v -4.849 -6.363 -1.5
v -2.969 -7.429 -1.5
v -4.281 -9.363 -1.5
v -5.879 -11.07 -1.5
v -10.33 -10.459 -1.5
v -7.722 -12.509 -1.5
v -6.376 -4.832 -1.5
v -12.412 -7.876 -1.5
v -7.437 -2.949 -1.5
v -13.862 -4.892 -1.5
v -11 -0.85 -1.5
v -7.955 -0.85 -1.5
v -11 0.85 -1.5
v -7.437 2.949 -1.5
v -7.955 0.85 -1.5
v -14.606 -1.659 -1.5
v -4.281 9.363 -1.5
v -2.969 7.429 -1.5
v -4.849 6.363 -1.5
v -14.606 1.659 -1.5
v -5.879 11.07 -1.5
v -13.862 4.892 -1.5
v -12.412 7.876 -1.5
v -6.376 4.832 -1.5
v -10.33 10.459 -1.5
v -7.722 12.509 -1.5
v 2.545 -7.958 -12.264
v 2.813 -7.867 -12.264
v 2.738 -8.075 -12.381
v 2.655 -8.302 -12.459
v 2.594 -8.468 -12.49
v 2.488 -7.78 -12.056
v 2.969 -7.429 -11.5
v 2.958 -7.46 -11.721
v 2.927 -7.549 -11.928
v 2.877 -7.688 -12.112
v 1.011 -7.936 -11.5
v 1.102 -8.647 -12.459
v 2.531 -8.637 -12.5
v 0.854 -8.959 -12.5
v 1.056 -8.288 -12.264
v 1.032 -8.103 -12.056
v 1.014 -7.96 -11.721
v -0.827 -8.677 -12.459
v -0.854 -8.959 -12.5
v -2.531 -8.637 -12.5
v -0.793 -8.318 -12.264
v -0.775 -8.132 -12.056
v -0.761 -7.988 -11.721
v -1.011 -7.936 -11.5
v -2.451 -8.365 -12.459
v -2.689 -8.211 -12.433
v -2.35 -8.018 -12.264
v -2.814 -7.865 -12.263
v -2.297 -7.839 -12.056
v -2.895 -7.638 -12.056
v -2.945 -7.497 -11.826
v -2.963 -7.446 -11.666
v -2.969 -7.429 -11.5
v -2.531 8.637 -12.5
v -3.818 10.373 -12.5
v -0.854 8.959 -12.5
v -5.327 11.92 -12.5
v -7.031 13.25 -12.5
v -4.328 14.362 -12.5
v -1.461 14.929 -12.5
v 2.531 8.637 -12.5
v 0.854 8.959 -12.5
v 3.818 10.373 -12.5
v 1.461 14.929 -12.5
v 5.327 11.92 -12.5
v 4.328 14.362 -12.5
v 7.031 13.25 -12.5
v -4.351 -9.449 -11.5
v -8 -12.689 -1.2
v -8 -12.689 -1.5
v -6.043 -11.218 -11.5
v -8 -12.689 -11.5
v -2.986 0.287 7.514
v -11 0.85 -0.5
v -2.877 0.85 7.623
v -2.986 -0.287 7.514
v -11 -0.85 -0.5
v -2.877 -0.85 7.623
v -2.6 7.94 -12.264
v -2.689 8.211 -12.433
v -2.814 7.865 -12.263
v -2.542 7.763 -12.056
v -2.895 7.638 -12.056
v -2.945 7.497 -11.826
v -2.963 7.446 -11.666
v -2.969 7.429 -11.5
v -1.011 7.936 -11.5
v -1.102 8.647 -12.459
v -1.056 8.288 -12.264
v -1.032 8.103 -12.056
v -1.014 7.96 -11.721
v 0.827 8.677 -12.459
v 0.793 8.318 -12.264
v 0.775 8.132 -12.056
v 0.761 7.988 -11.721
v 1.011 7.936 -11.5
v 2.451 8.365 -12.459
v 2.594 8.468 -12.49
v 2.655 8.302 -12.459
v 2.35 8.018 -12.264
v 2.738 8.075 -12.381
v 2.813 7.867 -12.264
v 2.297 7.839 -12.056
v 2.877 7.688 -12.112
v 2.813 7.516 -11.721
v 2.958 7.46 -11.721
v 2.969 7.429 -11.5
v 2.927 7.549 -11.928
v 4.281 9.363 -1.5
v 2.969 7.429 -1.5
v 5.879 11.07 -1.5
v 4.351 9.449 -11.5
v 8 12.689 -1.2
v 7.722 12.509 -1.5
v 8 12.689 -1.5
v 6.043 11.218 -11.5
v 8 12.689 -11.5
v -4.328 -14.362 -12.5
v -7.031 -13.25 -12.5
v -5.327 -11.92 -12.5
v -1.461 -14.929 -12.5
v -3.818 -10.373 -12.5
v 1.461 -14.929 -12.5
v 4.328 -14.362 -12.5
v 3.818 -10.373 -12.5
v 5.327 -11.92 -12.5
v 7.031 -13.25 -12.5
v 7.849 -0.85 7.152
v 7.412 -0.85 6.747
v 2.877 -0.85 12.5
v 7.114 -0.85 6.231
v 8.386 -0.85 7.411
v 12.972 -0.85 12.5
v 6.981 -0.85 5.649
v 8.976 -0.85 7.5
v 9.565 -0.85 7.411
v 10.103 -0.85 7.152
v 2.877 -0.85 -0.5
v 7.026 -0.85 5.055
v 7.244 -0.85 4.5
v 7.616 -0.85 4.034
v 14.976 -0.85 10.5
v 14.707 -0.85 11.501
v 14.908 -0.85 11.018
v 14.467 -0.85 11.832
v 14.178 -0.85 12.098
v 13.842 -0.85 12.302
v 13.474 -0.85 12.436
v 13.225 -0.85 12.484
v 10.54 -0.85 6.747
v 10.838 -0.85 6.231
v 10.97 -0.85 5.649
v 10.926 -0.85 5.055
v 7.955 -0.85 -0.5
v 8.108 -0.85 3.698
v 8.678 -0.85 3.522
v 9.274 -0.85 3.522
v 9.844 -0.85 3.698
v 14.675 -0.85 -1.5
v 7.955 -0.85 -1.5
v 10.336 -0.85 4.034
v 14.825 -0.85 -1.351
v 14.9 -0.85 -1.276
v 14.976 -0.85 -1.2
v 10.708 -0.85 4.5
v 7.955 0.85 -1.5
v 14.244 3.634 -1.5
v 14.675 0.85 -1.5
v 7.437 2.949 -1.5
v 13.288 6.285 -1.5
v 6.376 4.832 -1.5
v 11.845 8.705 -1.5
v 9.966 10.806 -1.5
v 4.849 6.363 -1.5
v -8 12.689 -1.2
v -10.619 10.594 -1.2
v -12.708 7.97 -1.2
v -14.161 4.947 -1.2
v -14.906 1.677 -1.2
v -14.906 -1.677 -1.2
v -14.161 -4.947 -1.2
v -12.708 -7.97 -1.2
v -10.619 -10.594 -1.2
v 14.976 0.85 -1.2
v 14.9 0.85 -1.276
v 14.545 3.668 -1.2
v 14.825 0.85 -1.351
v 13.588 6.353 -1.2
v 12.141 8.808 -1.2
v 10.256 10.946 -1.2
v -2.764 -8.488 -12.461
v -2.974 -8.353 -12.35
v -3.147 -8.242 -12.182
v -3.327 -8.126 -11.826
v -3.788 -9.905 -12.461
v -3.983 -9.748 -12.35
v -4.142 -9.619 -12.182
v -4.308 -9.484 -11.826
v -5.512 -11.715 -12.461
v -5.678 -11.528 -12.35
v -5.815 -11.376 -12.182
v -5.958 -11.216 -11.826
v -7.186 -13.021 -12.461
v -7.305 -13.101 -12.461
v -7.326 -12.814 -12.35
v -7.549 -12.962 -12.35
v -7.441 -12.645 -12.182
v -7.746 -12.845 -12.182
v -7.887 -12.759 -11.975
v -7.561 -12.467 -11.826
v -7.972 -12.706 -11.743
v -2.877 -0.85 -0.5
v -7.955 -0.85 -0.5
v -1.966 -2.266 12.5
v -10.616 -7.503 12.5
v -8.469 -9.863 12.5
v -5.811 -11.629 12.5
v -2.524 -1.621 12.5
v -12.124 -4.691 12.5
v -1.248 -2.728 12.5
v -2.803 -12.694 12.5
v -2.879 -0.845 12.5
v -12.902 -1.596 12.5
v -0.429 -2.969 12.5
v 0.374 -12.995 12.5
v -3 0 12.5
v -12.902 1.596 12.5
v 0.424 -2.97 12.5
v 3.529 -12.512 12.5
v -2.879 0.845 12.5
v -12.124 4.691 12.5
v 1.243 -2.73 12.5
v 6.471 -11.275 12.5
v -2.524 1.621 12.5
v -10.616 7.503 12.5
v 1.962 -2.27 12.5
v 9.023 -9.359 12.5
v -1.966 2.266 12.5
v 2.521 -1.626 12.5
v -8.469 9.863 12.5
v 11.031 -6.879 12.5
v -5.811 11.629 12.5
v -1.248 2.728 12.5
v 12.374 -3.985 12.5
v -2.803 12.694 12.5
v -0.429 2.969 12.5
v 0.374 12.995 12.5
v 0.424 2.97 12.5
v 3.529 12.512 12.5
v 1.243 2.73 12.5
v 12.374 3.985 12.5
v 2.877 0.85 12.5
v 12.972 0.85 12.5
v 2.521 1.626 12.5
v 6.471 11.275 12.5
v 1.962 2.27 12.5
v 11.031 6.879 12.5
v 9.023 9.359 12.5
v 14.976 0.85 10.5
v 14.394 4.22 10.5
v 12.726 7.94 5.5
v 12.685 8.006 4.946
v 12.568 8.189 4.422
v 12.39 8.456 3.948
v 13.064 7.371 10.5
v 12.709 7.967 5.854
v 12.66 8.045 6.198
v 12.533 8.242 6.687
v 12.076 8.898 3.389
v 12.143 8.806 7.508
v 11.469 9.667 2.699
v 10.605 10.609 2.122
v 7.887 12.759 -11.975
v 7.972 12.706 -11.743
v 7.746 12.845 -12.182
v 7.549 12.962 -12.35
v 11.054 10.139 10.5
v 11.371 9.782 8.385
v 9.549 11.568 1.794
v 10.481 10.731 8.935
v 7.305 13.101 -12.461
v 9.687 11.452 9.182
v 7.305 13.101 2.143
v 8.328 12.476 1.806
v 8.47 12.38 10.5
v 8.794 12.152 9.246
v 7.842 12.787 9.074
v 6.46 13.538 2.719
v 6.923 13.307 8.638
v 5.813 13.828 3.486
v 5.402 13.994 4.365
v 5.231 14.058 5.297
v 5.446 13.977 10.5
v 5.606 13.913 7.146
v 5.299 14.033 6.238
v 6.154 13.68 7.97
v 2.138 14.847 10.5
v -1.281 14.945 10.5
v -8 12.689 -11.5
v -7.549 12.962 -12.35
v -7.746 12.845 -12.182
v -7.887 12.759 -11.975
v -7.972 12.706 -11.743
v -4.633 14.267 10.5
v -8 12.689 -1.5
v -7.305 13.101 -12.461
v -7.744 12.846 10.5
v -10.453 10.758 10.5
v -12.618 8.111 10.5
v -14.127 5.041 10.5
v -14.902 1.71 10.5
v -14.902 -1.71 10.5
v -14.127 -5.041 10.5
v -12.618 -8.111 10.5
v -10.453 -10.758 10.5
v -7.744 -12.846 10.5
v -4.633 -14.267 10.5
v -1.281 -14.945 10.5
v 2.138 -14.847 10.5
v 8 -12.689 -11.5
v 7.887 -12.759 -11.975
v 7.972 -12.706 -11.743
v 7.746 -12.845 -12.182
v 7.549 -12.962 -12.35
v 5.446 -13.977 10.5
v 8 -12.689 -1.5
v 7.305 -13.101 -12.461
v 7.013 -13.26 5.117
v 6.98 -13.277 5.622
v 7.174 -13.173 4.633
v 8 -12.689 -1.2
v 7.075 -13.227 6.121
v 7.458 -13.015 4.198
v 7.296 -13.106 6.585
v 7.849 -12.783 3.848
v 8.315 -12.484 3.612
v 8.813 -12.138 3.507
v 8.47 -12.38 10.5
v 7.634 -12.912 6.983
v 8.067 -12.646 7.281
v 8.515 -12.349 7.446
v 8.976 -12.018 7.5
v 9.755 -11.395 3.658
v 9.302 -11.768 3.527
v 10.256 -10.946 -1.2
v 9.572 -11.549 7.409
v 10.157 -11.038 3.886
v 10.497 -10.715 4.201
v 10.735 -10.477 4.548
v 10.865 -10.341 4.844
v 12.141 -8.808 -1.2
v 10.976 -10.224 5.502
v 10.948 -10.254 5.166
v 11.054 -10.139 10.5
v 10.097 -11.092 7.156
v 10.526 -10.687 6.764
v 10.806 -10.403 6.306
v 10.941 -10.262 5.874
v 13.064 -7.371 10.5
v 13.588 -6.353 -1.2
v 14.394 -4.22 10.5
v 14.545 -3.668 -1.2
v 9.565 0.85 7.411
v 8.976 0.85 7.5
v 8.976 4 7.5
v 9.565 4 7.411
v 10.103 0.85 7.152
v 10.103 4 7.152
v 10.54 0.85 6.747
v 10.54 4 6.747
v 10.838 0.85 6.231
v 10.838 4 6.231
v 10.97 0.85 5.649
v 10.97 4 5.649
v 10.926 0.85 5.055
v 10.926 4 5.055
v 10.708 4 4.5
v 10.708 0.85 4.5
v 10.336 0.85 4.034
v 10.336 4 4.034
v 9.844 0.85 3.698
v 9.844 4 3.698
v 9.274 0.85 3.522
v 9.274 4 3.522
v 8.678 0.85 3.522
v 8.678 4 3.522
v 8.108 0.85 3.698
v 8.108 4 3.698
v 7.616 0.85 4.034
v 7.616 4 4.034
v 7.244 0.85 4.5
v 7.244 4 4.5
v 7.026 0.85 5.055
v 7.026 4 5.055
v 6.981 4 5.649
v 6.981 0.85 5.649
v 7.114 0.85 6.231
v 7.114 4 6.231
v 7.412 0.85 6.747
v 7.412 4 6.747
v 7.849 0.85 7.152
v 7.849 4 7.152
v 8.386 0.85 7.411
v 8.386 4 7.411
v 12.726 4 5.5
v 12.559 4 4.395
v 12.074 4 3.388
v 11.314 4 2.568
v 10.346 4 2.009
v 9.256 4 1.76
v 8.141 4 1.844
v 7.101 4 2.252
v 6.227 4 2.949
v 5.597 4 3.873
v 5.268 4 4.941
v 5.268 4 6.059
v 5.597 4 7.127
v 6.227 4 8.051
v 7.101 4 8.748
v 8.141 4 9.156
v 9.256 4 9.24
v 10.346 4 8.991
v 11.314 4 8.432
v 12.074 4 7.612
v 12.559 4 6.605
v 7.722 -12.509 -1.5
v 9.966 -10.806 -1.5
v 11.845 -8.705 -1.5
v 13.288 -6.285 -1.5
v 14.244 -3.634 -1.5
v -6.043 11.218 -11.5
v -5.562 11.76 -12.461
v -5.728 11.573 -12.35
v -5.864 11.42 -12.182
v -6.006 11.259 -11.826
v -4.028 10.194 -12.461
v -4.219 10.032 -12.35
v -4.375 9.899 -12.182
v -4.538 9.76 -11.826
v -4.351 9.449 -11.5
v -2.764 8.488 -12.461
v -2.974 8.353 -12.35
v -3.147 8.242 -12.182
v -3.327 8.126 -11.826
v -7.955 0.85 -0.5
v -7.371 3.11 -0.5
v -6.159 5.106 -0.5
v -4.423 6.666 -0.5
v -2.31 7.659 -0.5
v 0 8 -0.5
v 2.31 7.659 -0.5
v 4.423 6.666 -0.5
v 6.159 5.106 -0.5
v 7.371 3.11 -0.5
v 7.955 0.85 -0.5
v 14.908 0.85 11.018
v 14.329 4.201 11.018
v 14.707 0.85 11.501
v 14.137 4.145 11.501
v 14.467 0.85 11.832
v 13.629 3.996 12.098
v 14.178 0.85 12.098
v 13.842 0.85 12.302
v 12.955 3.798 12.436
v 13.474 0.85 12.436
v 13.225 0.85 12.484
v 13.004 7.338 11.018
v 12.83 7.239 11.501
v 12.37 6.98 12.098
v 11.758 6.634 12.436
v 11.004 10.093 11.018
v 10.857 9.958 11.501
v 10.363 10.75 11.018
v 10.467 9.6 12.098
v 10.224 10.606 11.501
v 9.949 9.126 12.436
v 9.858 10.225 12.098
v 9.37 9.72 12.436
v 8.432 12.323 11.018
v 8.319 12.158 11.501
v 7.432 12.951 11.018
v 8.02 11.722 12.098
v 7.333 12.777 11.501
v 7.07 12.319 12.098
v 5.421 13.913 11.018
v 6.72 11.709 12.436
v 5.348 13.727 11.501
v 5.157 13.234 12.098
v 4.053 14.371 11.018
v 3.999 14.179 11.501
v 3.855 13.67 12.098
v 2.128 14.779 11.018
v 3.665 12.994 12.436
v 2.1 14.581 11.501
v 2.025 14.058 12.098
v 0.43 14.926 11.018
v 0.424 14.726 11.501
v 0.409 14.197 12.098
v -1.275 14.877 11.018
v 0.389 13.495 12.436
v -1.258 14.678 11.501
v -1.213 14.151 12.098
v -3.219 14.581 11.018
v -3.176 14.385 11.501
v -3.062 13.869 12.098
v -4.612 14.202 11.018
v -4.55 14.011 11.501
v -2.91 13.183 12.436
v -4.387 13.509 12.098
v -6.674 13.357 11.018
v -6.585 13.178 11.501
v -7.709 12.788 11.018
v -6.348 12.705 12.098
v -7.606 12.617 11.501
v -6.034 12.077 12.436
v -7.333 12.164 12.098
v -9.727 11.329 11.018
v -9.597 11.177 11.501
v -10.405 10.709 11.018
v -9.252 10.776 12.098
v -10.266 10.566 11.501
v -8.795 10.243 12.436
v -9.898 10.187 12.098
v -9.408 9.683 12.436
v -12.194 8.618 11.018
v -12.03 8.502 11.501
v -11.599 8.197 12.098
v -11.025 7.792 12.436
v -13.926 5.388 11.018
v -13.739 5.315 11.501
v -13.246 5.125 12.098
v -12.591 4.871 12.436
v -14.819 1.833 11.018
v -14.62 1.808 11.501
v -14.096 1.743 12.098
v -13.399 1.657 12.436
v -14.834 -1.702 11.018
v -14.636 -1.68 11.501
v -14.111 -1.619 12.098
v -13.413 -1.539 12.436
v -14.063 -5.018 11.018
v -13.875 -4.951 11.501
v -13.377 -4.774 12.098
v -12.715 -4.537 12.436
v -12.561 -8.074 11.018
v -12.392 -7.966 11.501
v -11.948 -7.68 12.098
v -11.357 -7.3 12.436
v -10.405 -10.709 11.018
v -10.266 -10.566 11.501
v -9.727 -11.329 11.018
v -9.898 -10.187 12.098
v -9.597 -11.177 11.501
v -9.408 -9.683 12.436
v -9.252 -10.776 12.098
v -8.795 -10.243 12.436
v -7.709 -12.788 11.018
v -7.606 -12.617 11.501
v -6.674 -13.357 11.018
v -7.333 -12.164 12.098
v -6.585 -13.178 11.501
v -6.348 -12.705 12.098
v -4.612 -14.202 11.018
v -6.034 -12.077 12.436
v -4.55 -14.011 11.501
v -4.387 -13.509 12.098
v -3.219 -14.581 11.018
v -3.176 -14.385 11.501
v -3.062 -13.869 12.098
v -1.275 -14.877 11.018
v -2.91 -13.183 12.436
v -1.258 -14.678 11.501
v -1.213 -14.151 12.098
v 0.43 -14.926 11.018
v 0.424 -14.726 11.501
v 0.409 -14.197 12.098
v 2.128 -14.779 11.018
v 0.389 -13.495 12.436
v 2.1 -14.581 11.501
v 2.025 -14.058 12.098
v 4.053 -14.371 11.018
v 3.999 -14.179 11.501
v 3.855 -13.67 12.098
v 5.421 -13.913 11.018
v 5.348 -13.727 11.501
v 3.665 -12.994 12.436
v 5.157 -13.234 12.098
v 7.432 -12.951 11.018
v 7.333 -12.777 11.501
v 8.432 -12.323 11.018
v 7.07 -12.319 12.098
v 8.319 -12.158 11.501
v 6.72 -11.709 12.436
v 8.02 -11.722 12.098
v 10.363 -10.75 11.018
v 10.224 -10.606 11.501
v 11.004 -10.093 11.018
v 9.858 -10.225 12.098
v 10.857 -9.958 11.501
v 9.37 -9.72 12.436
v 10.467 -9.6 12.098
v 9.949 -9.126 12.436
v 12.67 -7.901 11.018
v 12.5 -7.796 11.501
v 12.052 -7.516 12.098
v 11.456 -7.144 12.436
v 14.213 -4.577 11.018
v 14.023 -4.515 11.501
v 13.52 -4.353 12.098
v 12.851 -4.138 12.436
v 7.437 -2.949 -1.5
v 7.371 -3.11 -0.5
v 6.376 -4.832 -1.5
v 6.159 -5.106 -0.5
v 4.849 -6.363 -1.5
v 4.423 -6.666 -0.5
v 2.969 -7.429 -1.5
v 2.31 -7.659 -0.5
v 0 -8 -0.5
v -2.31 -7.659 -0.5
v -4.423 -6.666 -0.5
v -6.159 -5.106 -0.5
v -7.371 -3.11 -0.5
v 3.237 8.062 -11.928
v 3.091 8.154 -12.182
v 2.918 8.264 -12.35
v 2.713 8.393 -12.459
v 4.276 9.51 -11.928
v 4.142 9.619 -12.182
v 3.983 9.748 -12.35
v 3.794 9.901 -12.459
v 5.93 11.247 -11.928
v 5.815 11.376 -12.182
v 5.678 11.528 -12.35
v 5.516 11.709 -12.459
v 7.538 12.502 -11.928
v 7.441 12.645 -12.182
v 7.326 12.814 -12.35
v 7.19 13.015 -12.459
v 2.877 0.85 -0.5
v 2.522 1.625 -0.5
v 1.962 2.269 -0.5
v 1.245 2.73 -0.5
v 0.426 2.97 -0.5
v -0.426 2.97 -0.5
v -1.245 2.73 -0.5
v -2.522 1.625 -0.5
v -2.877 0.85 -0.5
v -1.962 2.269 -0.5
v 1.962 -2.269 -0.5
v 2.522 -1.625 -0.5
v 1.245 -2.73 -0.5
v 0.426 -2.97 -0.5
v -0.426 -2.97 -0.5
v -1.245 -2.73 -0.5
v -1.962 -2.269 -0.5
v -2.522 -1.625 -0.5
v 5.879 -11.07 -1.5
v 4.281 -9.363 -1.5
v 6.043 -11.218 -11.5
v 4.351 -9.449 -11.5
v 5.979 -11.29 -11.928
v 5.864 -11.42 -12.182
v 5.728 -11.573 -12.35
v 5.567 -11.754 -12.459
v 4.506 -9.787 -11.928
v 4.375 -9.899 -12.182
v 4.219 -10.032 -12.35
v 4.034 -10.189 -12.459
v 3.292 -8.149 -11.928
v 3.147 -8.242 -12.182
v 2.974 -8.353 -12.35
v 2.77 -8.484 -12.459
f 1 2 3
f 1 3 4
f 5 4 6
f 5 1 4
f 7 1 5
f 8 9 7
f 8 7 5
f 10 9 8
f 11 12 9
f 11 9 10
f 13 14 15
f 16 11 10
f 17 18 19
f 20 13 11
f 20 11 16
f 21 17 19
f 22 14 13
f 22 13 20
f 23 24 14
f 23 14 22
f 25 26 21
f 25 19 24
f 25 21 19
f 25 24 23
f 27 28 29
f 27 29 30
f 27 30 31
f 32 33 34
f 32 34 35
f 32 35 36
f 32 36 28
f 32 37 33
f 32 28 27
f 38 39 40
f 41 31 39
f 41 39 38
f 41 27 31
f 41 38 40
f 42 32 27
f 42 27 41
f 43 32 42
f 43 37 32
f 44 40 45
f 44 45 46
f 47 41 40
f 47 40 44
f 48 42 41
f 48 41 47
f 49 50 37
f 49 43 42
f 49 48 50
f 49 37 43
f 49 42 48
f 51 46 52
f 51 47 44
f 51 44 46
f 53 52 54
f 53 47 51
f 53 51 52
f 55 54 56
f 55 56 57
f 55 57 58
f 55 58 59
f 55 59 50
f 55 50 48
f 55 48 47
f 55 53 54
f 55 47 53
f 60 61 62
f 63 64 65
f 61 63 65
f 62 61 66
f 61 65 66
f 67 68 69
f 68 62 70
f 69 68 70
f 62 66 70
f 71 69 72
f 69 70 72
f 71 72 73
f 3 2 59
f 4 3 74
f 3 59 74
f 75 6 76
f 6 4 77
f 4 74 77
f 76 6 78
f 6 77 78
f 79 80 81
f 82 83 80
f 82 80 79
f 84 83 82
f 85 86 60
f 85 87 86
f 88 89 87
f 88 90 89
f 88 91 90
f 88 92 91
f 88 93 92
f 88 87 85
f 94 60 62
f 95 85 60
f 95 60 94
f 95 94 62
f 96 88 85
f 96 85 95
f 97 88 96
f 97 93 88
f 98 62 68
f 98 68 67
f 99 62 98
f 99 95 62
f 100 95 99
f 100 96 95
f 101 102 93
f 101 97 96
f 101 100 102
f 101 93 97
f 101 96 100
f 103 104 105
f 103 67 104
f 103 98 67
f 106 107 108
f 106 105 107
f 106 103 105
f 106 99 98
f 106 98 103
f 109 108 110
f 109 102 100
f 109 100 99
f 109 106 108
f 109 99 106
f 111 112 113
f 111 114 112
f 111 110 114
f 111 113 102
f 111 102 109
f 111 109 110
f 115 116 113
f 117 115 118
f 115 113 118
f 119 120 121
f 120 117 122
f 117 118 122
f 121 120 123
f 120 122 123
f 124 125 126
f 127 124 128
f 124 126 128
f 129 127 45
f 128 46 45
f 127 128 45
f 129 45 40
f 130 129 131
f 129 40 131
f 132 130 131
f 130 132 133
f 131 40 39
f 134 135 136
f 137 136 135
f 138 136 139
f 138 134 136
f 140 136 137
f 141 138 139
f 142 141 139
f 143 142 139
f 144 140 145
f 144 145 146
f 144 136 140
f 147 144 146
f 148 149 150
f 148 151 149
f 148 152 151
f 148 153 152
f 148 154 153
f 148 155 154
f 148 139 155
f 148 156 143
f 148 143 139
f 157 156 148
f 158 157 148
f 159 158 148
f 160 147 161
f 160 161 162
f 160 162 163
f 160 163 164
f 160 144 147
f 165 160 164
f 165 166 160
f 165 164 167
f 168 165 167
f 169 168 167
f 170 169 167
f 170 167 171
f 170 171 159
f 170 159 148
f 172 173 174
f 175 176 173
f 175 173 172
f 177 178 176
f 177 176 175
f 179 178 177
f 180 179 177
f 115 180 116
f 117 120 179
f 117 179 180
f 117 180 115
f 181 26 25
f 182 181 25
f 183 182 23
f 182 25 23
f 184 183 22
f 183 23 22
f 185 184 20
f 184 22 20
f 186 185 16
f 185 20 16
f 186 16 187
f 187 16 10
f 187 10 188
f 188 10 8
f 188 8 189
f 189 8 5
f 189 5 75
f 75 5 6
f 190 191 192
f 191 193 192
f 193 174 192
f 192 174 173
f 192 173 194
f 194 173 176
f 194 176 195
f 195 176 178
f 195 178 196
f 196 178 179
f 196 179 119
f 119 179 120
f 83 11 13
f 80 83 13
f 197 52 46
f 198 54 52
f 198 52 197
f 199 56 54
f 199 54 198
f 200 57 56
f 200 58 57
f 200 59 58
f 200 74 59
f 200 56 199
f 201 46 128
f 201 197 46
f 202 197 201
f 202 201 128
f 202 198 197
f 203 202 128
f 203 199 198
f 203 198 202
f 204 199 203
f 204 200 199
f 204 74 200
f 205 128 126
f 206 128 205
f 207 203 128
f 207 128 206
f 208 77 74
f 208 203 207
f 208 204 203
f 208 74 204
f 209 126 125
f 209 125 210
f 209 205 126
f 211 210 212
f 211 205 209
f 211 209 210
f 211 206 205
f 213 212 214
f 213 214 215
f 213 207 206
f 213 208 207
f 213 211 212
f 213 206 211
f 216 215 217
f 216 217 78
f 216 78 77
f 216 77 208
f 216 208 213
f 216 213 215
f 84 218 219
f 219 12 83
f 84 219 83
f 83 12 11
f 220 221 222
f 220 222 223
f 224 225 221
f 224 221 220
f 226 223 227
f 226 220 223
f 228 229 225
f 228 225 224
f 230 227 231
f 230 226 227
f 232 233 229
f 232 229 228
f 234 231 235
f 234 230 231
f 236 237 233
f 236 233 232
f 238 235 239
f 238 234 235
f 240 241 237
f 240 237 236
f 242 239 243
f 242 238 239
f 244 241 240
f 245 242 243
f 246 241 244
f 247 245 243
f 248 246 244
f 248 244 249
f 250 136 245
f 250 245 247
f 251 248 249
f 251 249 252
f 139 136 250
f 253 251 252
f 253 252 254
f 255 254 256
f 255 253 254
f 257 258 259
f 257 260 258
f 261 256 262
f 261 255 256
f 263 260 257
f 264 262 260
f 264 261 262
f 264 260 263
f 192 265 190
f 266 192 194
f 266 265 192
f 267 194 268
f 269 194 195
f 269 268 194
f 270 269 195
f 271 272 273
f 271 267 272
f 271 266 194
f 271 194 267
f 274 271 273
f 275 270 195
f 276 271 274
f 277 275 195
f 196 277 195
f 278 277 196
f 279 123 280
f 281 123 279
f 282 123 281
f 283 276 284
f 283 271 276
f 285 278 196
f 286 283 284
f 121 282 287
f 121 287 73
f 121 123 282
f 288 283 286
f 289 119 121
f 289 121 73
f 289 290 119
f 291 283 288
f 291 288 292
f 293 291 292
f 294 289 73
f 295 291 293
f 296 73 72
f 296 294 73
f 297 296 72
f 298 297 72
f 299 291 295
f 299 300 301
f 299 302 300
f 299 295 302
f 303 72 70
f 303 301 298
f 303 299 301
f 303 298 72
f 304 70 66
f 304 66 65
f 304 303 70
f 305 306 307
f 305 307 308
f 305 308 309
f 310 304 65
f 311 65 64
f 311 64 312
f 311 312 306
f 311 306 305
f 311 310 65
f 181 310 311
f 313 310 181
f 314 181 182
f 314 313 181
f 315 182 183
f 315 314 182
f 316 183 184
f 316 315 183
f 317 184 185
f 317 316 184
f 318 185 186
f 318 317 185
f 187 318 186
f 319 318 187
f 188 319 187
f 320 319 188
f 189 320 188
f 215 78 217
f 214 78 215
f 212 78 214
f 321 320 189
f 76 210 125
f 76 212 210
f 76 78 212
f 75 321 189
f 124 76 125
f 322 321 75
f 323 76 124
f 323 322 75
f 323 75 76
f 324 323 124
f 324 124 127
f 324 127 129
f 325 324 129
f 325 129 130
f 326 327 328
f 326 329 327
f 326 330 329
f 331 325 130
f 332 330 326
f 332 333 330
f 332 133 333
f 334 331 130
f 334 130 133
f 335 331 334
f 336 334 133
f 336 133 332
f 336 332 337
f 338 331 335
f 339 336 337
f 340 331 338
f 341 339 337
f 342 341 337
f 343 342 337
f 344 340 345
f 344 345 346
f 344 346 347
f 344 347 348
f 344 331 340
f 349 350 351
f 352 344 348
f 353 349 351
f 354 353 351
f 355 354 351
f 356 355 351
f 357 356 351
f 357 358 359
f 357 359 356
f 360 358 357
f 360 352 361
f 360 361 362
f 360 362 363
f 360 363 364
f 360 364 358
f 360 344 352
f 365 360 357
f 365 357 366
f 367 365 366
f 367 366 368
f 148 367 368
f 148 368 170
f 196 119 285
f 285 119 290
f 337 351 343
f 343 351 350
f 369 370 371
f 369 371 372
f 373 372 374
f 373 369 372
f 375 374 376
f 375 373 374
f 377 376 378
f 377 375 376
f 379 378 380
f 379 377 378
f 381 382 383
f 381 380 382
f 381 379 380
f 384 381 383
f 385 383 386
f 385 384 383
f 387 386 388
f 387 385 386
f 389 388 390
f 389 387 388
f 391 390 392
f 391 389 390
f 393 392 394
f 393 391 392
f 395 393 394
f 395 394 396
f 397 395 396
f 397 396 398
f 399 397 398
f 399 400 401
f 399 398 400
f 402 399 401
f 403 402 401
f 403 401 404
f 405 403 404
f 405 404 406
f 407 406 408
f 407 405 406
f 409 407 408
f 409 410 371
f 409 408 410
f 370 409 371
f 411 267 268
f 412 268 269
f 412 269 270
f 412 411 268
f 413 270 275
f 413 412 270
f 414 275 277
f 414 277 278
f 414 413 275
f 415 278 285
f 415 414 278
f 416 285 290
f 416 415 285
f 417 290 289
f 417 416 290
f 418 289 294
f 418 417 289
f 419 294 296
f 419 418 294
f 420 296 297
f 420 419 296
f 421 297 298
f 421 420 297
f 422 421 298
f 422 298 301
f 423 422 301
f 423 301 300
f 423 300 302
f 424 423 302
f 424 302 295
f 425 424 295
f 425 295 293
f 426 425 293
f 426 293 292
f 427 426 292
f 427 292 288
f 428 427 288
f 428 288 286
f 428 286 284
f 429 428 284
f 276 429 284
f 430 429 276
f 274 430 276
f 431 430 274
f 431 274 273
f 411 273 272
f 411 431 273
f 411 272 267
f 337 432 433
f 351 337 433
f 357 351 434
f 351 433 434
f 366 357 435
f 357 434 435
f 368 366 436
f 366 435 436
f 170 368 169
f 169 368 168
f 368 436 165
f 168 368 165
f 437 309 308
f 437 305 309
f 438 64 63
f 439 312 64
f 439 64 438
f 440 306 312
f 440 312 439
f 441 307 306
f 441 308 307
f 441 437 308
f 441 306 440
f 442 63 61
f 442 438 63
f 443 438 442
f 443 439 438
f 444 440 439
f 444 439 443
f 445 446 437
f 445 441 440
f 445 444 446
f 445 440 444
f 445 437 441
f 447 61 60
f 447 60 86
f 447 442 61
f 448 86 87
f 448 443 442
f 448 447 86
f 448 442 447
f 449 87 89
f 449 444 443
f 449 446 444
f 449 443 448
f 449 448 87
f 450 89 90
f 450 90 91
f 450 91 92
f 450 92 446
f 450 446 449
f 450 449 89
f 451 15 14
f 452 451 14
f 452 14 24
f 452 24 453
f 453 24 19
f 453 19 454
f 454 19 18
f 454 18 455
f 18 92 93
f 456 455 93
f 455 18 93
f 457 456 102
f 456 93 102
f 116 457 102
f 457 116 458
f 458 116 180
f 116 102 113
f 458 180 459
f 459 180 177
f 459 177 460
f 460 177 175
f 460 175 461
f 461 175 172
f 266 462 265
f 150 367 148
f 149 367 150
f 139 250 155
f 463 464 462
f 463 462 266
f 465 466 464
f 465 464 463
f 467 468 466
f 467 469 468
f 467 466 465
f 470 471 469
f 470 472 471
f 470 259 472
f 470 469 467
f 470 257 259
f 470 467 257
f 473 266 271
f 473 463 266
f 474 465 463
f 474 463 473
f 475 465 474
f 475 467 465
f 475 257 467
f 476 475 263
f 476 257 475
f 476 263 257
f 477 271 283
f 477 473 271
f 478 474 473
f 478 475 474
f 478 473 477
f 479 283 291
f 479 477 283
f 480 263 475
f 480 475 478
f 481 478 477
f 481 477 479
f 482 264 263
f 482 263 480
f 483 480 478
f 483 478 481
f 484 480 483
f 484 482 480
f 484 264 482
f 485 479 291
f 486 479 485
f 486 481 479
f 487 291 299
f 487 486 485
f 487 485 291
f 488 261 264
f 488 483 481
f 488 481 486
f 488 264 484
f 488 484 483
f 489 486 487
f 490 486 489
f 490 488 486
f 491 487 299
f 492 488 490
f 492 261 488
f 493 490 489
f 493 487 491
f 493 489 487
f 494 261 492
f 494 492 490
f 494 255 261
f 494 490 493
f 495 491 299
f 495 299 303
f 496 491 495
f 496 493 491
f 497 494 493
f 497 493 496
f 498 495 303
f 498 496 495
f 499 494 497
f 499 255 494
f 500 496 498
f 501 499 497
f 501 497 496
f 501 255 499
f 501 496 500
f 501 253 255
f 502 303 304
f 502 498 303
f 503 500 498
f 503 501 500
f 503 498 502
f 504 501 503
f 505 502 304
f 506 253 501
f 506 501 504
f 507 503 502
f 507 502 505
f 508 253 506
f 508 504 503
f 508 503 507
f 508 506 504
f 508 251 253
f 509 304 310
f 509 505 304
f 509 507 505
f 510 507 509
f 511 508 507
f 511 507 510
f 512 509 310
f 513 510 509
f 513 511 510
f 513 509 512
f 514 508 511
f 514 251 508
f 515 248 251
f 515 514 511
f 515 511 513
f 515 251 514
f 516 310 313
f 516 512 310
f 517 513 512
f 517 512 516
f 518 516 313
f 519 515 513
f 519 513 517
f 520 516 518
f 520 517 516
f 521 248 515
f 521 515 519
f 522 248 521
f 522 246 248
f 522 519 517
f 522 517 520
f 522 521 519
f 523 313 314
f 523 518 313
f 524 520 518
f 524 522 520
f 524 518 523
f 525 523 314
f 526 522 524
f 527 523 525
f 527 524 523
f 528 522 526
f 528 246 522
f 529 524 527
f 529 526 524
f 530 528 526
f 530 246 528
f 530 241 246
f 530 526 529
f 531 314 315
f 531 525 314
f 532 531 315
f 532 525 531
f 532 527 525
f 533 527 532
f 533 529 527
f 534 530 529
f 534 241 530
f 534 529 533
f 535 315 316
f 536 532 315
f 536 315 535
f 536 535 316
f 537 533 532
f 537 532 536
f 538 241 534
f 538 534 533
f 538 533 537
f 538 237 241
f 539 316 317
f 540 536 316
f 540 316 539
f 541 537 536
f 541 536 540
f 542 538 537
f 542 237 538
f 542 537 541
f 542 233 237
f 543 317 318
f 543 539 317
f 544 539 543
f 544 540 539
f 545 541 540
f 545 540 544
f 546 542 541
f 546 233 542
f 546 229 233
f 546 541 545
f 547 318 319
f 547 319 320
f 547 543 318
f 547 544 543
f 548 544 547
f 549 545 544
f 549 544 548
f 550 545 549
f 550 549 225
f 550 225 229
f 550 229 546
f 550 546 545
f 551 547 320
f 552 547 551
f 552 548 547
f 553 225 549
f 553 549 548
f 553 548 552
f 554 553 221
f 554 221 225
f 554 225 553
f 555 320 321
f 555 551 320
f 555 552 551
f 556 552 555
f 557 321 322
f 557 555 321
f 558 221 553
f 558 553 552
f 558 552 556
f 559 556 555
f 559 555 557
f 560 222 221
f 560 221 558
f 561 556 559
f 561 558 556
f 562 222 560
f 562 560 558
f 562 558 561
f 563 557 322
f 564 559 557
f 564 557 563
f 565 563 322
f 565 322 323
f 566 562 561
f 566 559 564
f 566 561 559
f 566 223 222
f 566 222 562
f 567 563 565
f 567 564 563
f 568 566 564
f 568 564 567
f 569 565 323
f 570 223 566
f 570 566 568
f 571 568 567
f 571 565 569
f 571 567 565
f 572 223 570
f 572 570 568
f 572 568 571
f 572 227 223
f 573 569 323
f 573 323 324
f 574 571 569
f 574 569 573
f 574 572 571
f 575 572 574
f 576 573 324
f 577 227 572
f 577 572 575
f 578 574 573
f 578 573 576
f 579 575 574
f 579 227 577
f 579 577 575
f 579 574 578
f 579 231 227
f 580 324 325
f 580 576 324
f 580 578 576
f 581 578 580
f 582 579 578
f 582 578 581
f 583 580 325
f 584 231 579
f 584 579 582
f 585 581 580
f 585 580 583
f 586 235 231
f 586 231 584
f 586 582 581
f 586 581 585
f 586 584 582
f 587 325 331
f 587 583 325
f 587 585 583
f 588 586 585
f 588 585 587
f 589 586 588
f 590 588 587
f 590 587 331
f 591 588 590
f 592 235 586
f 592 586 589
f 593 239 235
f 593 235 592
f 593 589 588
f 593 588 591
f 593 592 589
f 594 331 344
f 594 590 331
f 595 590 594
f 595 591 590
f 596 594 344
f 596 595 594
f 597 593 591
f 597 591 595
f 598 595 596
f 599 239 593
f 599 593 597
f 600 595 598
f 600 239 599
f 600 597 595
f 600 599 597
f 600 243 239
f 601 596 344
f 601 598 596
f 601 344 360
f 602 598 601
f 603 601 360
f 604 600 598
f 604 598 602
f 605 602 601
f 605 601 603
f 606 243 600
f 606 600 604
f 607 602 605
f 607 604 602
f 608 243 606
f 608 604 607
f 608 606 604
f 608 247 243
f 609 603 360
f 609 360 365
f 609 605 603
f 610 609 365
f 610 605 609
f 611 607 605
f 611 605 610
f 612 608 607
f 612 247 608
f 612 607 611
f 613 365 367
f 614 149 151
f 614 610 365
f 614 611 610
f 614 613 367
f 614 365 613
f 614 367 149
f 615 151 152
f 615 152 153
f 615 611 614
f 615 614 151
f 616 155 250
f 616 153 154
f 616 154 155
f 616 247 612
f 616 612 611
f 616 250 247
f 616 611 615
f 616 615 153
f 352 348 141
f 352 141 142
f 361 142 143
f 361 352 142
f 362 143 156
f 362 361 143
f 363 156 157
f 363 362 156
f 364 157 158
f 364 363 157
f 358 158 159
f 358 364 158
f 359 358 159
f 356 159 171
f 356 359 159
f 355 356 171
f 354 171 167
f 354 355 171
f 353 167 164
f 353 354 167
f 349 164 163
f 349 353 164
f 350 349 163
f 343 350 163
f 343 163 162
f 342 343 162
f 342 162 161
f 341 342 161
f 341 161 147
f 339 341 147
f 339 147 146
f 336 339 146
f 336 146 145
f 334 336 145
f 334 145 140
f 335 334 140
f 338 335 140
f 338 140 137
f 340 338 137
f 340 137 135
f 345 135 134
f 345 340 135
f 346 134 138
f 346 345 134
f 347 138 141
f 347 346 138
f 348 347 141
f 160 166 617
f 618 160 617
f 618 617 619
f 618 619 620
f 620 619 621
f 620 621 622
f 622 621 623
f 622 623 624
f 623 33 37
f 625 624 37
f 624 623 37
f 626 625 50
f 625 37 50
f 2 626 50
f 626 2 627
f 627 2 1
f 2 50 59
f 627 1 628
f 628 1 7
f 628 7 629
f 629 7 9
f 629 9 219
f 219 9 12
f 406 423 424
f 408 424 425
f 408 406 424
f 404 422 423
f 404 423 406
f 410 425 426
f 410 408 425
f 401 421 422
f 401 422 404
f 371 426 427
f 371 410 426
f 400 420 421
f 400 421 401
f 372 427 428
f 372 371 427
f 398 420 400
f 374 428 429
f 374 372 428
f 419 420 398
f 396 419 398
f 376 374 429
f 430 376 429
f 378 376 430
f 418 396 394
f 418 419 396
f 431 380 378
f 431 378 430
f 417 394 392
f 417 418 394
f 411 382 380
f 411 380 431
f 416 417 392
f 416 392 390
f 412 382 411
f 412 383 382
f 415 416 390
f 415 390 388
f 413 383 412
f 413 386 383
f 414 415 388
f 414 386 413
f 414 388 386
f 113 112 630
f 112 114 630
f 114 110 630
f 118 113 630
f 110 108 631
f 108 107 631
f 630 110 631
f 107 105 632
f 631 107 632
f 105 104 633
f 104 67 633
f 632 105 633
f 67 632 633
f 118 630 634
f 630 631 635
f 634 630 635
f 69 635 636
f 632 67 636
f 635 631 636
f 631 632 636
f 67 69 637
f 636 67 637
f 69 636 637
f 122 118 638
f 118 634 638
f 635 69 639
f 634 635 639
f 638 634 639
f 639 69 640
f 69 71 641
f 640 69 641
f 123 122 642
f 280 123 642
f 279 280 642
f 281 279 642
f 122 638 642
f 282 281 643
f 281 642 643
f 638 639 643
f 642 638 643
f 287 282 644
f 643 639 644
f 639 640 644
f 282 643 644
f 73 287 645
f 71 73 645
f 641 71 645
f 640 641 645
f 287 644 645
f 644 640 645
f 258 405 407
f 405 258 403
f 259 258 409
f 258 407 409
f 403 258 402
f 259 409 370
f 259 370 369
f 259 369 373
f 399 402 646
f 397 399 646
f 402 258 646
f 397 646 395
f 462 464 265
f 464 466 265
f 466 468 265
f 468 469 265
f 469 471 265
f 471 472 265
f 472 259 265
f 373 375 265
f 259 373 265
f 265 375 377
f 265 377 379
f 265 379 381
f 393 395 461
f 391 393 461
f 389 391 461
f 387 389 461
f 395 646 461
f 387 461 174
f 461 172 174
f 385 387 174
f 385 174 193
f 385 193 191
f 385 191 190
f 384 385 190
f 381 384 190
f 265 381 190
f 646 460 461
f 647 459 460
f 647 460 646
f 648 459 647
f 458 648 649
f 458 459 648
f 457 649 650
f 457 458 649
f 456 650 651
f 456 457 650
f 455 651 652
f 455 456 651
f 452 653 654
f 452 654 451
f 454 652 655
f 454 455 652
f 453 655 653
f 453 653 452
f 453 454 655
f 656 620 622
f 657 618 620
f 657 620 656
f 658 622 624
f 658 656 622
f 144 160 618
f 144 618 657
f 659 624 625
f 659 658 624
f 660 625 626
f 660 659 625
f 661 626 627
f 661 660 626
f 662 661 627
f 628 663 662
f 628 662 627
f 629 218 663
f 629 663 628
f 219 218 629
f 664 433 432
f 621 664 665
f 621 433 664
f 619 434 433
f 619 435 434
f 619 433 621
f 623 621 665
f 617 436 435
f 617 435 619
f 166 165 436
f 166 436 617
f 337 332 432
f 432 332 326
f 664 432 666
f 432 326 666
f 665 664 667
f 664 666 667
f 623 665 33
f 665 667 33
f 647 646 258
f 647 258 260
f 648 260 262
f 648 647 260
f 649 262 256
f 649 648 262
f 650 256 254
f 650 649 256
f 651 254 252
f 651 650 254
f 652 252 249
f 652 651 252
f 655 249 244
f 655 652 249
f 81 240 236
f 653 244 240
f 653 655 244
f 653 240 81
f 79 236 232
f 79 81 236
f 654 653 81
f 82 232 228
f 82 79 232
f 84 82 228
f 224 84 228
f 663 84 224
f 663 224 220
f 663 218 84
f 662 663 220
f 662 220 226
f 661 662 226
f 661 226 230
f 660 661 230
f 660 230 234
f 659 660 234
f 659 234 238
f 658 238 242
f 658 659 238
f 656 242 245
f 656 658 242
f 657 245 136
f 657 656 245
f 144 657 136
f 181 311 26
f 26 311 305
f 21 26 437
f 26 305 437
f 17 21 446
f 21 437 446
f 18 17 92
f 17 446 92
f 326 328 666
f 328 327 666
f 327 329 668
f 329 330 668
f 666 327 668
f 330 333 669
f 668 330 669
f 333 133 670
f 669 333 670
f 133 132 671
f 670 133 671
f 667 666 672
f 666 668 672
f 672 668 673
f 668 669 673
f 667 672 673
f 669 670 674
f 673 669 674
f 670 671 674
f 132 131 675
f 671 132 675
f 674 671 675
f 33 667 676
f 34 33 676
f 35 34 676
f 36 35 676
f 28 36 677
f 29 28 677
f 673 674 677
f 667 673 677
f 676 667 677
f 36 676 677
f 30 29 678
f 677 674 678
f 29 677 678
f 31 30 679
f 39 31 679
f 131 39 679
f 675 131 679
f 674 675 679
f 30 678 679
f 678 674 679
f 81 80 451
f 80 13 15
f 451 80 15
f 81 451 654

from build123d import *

# Parameters (mm, degrees)
SKETCH1_R               = 15
SKETCH1_R_2             = 3
BOSS_EXTRUDE1_DEPTH     = 12.5
SKETCH2_R               = 15
CUT_EXTRUDE1_DEPTH      = 11
CUT_EXTRUDE2_DEPTH      = 12
CUT_EXTRUDE3_DEPTH      = 1.7
CUT_EXTRUDE4_DEPTH      = 25.622144504
CUT_EXTRUDE4_DEPTH_BACK = 25.622144504
SKETCH7_R               = 2
CUT_EXTRUDE5_START      = 4.85
SKETCH8_R               = 3.75
CUT_EXTRUDE5_DEPTH      = 21.299006117
FILLET1_R               = 2
FILLET2_R               = 1
CHAMFER1_SIZE           = 0.3


with BuildPart() as part:
    # Sketch1 → Boss-Extrude1 (new, symmetric)
    with BuildSketch(Plane.XY):
        Circle(SKETCH1_R)
        Circle(SKETCH1_R_2, mode=Mode.SUBTRACT)
    extrude(amount=BOSS_EXTRUDE1_DEPTH, both=True)

    # Sketch2 → Cut-Extrude1 (cut)
    with BuildSketch(Plane(origin=(0, 0, -12.5), x_dir=(-1, 0, 0), z_dir=(0, 0, -1))):
        with Locations((-16, 0)):
            Circle(SKETCH2_R)
        with Locations((16, 0)):
            Circle(SKETCH2_R)
    extrude(amount=-CUT_EXTRUDE1_DEPTH, mode=Mode.SUBTRACT)

    # Sketch3 → Cut-Extrude2 (cut)
    with BuildSketch(Plane(origin=(0, 0, -12.5), x_dir=(-1, 0, 0), z_dir=(0, 0, -1))):
        with BuildLine():
            Line((7.954715583, -0.85), (11, -0.85))
            Line((11, -0.85), (11, 0.85))
            Line((11, 0.85), (7.954715583, 0.85))
            ThreePointArc((7.954715583, 0.85), (-8, 0), (7.954715583, -0.85))
        make_face()
    extrude(amount=-CUT_EXTRUDE2_DEPTH, mode=Mode.SUBTRACT)

    # Sketch6 → Cut-Extrude3 (cut)
    with BuildSketch(Plane(origin=(0, -0.85, 0), x_dir=(1, 0, 0), z_dir=(0, 1, 0))):
        Polygon((-11, 0.5), (15, -25.5), (15, 0.5), (15, 1.5), (-11, 1.5), align=None)
    extrude(amount=CUT_EXTRUDE3_DEPTH, mode=Mode.SUBTRACT)

    # Sketch7 → Cut-Extrude4 (cut, two sides: drawn at the far end of the back side and taken through both)
    with BuildSketch(Plane(origin=(0, 0, 0), x_dir=(1, 0, 0), z_dir=(0, 1, 0)).offset(-CUT_EXTRUDE4_DEPTH_BACK)):
        with Locations(Location((8.975897302, -5.5, 0), (0, 0, 270))):
            Circle(SKETCH7_R)
    extrude(amount=CUT_EXTRUDE4_DEPTH + CUT_EXTRUDE4_DEPTH_BACK, mode=Mode.SUBTRACT)

    # Sketch8 → Cut-Extrude5 (cut, through all)
    with BuildSketch(Plane(origin=(0, -0.85, 0), x_dir=(1, 0, 0), z_dir=(0, 1, 0)).offset(CUT_EXTRUDE5_START)):
        with Locations((8.975897302, -5.5)):
            Circle(SKETCH8_R)
    extrude(amount=CUT_EXTRUDE5_DEPTH, mode=Mode.SUBTRACT)

    # Fillet1
    fillet1_edges = [part.edges().sort_by_distance(p)[0] for p in [
        (-15, 0, 12.5),
    ]]
    fillet(fillet1_edges, radius=FILLET1_R)

    # Fillet2
    fillet2_edges = [part.edges().sort_by_distance(p)[0] for p in [
        (5.160499055, -10.368472369, -12.5),
        (-5.160499055, 10.368472369, -12.5),
        (-5.160499055, -10.368472369, -12.5),
        (5.160499055, 10.368472369, -12.5),
        (0, 8, -12.5),
        (0, -8, -12.5),
    ]]
    fillet(fillet2_edges, radius=FILLET2_R)

    # Chamfer1
    chamfer1_edges = [part.edges().sort_by_distance(p)[0] for p in [
        (12.923271403, 7.615054579, -1.5),
        (-15, 0, -1.5),
        (12.923271403, -7.615054579, -1.5),
    ]]
    chamfer(chamfer1_edges, length=CHAMFER1_SIZE)


solid = part.part
